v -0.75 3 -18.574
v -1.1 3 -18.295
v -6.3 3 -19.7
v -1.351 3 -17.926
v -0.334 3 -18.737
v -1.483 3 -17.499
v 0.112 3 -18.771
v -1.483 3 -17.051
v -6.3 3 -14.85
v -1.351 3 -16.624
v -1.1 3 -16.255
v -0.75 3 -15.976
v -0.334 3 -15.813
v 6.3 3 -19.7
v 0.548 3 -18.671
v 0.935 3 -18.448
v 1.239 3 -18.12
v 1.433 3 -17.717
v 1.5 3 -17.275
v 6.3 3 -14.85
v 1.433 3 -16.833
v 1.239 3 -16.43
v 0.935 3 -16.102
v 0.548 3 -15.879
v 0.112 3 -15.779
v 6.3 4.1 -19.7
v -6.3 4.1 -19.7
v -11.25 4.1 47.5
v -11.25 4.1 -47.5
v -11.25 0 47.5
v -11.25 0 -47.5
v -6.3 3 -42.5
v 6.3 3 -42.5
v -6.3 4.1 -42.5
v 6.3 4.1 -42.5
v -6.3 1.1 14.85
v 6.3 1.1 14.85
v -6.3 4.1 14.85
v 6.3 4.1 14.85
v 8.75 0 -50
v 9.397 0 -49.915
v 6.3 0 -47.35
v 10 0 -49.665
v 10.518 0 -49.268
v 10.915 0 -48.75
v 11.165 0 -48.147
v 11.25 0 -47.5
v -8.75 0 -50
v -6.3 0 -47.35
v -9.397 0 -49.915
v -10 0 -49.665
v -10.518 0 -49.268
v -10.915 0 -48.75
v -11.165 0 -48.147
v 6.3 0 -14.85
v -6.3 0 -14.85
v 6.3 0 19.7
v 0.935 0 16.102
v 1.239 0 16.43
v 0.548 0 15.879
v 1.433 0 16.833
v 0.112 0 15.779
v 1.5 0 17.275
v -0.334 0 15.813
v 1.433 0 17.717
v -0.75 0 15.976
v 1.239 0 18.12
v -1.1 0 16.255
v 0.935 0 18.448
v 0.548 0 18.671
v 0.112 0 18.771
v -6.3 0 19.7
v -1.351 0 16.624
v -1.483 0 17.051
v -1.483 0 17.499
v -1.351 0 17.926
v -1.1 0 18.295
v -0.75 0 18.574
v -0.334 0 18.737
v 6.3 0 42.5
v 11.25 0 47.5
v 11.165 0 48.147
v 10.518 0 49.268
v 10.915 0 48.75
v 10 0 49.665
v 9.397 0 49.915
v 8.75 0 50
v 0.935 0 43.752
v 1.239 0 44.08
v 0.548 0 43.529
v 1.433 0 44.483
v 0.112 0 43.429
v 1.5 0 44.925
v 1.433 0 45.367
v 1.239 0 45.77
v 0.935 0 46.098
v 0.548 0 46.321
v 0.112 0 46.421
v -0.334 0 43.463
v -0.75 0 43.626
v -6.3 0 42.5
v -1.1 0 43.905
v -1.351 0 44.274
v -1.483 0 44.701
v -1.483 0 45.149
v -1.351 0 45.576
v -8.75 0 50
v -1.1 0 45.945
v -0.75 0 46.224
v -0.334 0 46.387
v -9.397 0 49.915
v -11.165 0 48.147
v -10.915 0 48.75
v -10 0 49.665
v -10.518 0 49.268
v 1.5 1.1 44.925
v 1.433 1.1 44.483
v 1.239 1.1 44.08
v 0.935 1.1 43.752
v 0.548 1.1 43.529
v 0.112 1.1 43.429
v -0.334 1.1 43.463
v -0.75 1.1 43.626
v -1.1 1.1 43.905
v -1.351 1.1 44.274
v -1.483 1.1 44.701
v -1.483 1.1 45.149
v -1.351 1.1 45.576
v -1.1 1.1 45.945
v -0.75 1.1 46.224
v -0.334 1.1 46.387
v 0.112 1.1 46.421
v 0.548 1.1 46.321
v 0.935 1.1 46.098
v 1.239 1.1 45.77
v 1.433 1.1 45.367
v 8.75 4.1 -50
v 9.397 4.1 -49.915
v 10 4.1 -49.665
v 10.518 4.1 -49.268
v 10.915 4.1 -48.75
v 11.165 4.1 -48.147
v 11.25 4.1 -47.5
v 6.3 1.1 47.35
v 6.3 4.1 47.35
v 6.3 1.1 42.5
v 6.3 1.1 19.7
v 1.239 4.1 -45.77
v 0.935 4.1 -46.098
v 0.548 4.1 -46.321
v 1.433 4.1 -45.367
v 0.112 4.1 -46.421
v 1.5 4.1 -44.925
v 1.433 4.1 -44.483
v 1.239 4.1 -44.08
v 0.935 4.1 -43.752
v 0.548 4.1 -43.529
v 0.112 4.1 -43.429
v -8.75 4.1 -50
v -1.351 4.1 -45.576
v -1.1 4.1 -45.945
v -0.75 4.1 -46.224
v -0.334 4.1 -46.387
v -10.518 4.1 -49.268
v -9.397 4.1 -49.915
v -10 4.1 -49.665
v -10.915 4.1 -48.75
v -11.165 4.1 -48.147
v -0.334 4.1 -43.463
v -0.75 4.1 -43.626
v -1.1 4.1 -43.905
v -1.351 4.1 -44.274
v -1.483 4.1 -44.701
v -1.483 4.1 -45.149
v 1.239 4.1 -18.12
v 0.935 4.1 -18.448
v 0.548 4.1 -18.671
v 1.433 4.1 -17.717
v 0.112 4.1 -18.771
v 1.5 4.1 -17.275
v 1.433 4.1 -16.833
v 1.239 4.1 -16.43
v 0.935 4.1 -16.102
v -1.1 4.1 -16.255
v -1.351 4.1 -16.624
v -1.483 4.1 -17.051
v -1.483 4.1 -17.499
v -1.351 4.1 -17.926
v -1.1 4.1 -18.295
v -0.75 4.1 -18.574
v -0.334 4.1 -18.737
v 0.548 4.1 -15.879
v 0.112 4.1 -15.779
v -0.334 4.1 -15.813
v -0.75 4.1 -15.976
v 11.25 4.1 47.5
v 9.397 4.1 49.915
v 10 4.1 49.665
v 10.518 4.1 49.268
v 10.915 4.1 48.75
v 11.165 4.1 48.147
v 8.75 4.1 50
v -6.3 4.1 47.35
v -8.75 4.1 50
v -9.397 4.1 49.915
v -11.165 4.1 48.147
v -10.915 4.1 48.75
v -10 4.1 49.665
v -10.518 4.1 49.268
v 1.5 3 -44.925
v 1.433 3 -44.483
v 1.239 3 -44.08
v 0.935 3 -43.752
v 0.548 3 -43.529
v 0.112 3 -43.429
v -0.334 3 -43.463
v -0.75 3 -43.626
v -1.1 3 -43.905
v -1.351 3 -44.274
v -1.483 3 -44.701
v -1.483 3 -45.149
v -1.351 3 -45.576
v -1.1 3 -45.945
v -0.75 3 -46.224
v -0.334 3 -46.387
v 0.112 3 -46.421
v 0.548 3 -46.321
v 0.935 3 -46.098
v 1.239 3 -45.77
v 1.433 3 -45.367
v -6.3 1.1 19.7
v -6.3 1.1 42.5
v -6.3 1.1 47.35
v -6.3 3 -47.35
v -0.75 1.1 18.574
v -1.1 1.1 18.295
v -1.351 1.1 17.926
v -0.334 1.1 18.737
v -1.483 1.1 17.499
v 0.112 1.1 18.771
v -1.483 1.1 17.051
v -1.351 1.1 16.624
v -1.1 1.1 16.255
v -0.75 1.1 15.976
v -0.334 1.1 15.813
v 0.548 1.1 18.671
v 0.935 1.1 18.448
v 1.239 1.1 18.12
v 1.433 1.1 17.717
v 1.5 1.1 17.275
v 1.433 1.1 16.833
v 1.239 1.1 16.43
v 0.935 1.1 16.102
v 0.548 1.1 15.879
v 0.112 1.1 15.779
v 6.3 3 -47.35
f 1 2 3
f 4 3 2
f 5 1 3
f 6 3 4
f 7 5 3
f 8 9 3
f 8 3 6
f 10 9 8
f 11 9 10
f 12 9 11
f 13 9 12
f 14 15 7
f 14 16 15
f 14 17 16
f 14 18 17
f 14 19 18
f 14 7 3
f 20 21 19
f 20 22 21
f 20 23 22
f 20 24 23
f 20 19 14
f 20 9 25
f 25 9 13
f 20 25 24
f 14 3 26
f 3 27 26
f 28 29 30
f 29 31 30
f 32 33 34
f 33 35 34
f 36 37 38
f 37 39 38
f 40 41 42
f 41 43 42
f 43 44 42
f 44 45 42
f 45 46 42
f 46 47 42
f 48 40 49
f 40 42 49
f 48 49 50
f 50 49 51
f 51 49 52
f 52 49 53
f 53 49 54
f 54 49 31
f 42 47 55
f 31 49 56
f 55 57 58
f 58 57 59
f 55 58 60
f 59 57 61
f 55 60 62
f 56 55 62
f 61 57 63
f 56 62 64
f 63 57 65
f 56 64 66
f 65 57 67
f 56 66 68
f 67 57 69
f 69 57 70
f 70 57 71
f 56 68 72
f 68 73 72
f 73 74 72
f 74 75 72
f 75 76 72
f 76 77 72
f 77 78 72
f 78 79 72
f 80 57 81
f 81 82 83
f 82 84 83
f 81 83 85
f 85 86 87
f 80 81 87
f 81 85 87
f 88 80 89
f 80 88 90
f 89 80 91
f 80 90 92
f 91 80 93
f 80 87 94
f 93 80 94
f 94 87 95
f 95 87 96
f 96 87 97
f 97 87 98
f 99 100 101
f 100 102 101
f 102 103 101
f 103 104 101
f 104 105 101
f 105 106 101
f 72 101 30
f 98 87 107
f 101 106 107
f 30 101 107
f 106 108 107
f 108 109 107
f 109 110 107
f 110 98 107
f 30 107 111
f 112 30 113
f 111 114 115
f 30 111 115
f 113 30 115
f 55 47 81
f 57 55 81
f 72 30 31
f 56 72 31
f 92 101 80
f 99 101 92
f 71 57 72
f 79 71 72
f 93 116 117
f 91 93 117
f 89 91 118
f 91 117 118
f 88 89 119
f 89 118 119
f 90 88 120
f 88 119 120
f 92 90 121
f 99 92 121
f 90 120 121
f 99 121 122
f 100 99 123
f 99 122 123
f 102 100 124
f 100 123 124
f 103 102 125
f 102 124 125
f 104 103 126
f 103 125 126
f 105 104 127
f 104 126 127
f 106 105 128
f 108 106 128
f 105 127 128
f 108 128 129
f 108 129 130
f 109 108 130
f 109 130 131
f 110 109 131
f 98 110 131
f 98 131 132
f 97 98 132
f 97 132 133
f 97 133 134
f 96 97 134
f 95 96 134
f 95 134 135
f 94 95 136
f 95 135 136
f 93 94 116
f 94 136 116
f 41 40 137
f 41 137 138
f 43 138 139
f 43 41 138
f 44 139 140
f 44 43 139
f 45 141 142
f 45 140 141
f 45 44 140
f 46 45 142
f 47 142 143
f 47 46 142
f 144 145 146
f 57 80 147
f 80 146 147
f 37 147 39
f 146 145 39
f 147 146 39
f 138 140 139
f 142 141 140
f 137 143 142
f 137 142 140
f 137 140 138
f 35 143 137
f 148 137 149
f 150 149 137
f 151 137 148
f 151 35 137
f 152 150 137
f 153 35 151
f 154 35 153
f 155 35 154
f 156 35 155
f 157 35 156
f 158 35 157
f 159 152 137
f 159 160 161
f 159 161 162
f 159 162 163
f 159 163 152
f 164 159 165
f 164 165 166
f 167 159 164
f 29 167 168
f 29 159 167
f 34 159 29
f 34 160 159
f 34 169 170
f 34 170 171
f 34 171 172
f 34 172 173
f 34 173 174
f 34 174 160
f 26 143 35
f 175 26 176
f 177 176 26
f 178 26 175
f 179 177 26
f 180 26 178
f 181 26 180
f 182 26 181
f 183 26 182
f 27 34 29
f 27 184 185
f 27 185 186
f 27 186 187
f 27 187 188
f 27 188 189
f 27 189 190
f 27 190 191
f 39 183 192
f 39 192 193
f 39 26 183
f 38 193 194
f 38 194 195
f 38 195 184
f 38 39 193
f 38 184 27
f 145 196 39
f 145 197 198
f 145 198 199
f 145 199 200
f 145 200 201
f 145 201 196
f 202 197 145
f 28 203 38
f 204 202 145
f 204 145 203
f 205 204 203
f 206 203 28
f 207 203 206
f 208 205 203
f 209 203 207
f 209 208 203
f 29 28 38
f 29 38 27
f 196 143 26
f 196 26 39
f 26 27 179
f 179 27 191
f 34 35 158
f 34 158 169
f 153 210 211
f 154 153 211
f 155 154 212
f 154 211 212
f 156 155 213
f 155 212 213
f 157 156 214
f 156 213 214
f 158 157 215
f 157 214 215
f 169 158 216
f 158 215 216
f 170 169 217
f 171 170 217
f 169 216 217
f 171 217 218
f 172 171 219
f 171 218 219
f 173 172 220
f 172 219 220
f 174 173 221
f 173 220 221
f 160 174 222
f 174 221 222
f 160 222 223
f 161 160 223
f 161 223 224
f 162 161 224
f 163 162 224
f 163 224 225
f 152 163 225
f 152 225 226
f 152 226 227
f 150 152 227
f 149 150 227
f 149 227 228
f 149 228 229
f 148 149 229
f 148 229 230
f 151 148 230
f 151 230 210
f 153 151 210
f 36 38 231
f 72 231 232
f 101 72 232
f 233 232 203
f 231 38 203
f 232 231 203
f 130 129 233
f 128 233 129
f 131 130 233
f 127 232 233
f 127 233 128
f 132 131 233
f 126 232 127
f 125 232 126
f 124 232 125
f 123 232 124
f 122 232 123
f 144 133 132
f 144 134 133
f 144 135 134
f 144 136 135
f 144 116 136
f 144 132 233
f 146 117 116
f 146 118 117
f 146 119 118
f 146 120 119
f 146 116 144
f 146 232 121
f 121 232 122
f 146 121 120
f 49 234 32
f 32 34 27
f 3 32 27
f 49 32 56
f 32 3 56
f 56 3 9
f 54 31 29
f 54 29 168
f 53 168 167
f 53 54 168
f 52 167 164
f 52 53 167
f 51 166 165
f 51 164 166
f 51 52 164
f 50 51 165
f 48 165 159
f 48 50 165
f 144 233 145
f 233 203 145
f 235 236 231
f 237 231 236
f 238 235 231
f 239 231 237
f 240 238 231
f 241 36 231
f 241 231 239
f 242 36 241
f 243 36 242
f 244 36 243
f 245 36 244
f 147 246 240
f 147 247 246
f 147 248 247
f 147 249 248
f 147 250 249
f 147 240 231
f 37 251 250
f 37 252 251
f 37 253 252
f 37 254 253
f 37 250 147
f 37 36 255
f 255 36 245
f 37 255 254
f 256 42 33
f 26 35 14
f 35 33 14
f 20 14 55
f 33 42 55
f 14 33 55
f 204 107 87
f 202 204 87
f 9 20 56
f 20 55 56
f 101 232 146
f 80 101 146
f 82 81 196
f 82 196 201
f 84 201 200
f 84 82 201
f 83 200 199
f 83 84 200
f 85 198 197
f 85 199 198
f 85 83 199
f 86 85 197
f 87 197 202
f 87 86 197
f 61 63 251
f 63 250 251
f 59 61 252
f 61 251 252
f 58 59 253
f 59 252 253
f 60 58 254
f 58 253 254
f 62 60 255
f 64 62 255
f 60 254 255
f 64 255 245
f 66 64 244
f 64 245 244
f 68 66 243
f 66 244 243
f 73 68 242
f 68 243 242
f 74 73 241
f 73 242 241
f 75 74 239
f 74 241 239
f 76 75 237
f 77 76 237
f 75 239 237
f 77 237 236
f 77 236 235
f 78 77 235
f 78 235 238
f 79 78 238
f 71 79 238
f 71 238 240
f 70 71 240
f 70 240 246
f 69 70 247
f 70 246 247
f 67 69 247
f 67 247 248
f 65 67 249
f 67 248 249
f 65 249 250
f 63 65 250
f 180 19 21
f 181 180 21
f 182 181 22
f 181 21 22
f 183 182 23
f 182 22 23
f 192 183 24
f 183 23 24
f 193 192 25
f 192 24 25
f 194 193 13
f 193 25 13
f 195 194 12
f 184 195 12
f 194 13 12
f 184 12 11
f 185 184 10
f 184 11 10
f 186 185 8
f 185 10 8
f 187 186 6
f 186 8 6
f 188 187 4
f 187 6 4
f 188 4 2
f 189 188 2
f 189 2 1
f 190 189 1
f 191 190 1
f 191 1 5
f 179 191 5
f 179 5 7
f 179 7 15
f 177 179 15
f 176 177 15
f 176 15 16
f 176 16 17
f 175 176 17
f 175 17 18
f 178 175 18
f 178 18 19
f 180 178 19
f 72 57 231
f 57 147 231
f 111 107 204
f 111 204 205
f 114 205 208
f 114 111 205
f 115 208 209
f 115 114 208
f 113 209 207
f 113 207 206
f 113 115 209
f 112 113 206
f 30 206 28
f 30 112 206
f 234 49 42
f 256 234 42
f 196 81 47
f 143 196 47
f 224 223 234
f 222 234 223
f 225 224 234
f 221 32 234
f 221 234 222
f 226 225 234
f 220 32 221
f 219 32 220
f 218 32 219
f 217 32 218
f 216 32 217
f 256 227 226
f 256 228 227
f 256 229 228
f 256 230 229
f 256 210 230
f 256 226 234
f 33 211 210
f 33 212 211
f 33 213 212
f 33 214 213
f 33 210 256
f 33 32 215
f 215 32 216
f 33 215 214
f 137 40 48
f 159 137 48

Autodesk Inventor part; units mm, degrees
ref_plane "YZ Plane" through (0, 0, 0) normal (1, 0, 0) x (0, 1, 0)
ref_plane "XZ Plane" through (0, 0, 0) normal (0, 1, 0) x (-1, 0, 0)
ref_plane "XY Plane" through (0, 0, 0) normal (0, 0, 1) x (1, 0, 0)
sketch "Szkic1" plane through (0, 0, 0) normal (0, 1, 0) x (-1, 0, 0)
  line L0 (8.75, 50) -> (-8.75, 50)
  line L1 (-11.25, 47.5) -> (-11.25, -47.5)
  line L2 (-8.75, -50) -> (8.75, -50)
  line L3 (11.25, -47.5) -> (11.25, 47.5)
  line L4 (-11.25, 50) -> (11.25, -50)
  line L5 (-11.25, -50) -> (11.25, 50)
  arc A0 (11.25, 47.5) -> (8.75, 50) centre (8.75, 47.5) ccw
  arc A1 (-8.75, 50) -> (-11.25, 47.5) centre (-8.75, 47.5) ccw
  arc A2 (-11.25, -47.5) -> (-8.75, -50) centre (-8.75, -47.5) ccw
  arc A3 (8.75, -50) -> (11.25, -47.5) centre (8.75, -47.5) ccw
  point P0 (0, 0)
  point P1 (0, 0)
  dimension "d0" = 22.5
  dimension "d1" = 100
  dimension "d2" = 2.5
extrude "Wyciągnięcie proste1" add sketch "Szkic1" along normal blind 4.1
sketch "Szkic2" plane through (0, 4.1, 0) normal (0, 1, 0) x (1, 0, 0)
  line L0 (-6.3, -42.5) -> (6.3, -42.5)
  line L1 (6.3, -42.5) -> (6.3, -19.7)
  line L2 (6.3, -19.7) -> (-6.3, -19.7)
  line L3 (-6.3, -19.7) -> (-6.3, -42.5)
  line L4 (-8.75, -50) -> (8.75, -50) projected
  line L5 (11.25, -47.5) -> (11.25, 47.5) projected
  line L6 (-6.3, 19.7) -> (6.3, 19.7)
  line L7 (6.3, 19.7) -> (6.3, 42.5)
  line L8 (6.3, 42.5) -> (-6.3, 42.5)
  line L9 (-6.3, 42.5) -> (-6.3, 19.7)
  line L10 (-15.75, 0) -> (15.75, 0) projected
  point P0 (0, 0)
  point P1 (0, -42.5)
  dimension "d5" = 12.6
  dimension "d6" = 22.8
  dimension "d7" = 7.5
  dimension "d8" = 11.25
extrude "Wyciągnięcie proste2" cut sketch "Szkic2" against normal blind 4.1
sketch "Szkic4" plane through (0, 4.1, 0) normal (0, 1, 0) x (1, 0, 0)
  line L0 (-6.3, -47.35) -> (6.3, -47.35)
  line L1 (6.3, -47.35) -> (6.3, -14.85)
  line L2 (6.3, -14.85) -> (-6.3, -14.85)
  line L3 (-6.3, -14.85) -> (-6.3, -47.35)
  line L4 (6.3, -42.5) -> (-6.3, -42.5) projected
  line L5 (-6.3, -19.7) -> (6.3, -19.7) projected
  point P0 (0, 0)
  dimension "d11" = 4.85
  dimension "d12" = 4.85
extrude "Wyciągnięcie proste3" cut sketch "Szkic4" against normal blind 3 contours L3 L4 L1 L0 | L3 L2 L1 L5
sketch "Szkic5" plane through (0, 1.1, 0) normal (0, 1, 0) x (1, 0, 0)
  circle A0 centre (0, -44.925) radius 1.5
  circle A1 centre (0, -17.275) radius 1.5
  circle A2 centre (0, 17.275) radius 1.5
  circle A3 centre (0, 44.925) radius 1.5
  line L0 (-6.3, -42.5) -> (6.3, -42.5) projected
  line L1 (6.3, -19.7) -> (-6.3, -19.7) projected
  line L2 (-6.3, 19.7) -> (6.3, 19.7) projected
  line L3 (6.3, 42.5) -> (-6.3, 42.5) projected
  point P0 (0, 0)
  point P1 (0, -42.5)
  point P2 (0, -19.7)
  point P3 (0, 19.7)
  point P4 (0, 42.5)
  dimension "d17" = 3
  dimension "d18" = 3
  dimension "d19" = 3
  dimension "d20" = 3
  dimension "d21" = 2.425
  dimension "d22" = 2.425
  dimension "d23" = 2.425
  dimension "d24" = 2.425
extrude "Wyciągnięcie proste4" cut sketch "Szkic5" against normal blind 3
sketch "Szkic6" plane through (0, 0, 0) normal (0, -1, 0) x (1, 0, 0)
  line L0 (-6.3, -19.7) -> (6.3, -19.7)
  line L1 (6.3, -19.7) -> (6.3, -14.85)
  line L2 (6.3, -14.85) -> (-6.3, -14.85)
  line L3 (-6.3, -14.85) -> (-6.3, -19.7)
  line L4 (-6.3, -47.35) -> (6.3, -47.35)
  line L5 (6.3, -47.35) -> (6.3, -42.5)
  line L6 (6.3, -42.5) -> (-6.3, -42.5)
  line L7 (-6.3, -42.5) -> (-6.3, -47.35)
  point P0 (0, 0)
  dimension "d27" = 4.85
  dimension "d28" = 4.85
extrude "Wyciągnięcie proste5" cut sketch "Szkic6" against normal blind 3
sketch "Szkic7" plane through (0, 3, 0) normal (0, -1, 0) x (1, 0, 0)
  circle A0 centre (0, -44.925) radius 1.5
  circle A1 centre (0, -17.275) radius 1.5
  line L0 (6.3, -19.7) -> (-6.3, -19.7) projected
  line L1 (-6.3, -42.5) -> (6.3, -42.5) projected
  point P0 (0, 0)
  point P1 (0, -19.7)
  dimension "d31" = 3
  dimension "d32" = 3
  dimension "d33" = 2.425
  dimension "d34" = 2.425
extrude "Wyciągnięcie proste6" cut sketch "Szkic7" against normal blind 3
properties part number "arm_medium_part"
